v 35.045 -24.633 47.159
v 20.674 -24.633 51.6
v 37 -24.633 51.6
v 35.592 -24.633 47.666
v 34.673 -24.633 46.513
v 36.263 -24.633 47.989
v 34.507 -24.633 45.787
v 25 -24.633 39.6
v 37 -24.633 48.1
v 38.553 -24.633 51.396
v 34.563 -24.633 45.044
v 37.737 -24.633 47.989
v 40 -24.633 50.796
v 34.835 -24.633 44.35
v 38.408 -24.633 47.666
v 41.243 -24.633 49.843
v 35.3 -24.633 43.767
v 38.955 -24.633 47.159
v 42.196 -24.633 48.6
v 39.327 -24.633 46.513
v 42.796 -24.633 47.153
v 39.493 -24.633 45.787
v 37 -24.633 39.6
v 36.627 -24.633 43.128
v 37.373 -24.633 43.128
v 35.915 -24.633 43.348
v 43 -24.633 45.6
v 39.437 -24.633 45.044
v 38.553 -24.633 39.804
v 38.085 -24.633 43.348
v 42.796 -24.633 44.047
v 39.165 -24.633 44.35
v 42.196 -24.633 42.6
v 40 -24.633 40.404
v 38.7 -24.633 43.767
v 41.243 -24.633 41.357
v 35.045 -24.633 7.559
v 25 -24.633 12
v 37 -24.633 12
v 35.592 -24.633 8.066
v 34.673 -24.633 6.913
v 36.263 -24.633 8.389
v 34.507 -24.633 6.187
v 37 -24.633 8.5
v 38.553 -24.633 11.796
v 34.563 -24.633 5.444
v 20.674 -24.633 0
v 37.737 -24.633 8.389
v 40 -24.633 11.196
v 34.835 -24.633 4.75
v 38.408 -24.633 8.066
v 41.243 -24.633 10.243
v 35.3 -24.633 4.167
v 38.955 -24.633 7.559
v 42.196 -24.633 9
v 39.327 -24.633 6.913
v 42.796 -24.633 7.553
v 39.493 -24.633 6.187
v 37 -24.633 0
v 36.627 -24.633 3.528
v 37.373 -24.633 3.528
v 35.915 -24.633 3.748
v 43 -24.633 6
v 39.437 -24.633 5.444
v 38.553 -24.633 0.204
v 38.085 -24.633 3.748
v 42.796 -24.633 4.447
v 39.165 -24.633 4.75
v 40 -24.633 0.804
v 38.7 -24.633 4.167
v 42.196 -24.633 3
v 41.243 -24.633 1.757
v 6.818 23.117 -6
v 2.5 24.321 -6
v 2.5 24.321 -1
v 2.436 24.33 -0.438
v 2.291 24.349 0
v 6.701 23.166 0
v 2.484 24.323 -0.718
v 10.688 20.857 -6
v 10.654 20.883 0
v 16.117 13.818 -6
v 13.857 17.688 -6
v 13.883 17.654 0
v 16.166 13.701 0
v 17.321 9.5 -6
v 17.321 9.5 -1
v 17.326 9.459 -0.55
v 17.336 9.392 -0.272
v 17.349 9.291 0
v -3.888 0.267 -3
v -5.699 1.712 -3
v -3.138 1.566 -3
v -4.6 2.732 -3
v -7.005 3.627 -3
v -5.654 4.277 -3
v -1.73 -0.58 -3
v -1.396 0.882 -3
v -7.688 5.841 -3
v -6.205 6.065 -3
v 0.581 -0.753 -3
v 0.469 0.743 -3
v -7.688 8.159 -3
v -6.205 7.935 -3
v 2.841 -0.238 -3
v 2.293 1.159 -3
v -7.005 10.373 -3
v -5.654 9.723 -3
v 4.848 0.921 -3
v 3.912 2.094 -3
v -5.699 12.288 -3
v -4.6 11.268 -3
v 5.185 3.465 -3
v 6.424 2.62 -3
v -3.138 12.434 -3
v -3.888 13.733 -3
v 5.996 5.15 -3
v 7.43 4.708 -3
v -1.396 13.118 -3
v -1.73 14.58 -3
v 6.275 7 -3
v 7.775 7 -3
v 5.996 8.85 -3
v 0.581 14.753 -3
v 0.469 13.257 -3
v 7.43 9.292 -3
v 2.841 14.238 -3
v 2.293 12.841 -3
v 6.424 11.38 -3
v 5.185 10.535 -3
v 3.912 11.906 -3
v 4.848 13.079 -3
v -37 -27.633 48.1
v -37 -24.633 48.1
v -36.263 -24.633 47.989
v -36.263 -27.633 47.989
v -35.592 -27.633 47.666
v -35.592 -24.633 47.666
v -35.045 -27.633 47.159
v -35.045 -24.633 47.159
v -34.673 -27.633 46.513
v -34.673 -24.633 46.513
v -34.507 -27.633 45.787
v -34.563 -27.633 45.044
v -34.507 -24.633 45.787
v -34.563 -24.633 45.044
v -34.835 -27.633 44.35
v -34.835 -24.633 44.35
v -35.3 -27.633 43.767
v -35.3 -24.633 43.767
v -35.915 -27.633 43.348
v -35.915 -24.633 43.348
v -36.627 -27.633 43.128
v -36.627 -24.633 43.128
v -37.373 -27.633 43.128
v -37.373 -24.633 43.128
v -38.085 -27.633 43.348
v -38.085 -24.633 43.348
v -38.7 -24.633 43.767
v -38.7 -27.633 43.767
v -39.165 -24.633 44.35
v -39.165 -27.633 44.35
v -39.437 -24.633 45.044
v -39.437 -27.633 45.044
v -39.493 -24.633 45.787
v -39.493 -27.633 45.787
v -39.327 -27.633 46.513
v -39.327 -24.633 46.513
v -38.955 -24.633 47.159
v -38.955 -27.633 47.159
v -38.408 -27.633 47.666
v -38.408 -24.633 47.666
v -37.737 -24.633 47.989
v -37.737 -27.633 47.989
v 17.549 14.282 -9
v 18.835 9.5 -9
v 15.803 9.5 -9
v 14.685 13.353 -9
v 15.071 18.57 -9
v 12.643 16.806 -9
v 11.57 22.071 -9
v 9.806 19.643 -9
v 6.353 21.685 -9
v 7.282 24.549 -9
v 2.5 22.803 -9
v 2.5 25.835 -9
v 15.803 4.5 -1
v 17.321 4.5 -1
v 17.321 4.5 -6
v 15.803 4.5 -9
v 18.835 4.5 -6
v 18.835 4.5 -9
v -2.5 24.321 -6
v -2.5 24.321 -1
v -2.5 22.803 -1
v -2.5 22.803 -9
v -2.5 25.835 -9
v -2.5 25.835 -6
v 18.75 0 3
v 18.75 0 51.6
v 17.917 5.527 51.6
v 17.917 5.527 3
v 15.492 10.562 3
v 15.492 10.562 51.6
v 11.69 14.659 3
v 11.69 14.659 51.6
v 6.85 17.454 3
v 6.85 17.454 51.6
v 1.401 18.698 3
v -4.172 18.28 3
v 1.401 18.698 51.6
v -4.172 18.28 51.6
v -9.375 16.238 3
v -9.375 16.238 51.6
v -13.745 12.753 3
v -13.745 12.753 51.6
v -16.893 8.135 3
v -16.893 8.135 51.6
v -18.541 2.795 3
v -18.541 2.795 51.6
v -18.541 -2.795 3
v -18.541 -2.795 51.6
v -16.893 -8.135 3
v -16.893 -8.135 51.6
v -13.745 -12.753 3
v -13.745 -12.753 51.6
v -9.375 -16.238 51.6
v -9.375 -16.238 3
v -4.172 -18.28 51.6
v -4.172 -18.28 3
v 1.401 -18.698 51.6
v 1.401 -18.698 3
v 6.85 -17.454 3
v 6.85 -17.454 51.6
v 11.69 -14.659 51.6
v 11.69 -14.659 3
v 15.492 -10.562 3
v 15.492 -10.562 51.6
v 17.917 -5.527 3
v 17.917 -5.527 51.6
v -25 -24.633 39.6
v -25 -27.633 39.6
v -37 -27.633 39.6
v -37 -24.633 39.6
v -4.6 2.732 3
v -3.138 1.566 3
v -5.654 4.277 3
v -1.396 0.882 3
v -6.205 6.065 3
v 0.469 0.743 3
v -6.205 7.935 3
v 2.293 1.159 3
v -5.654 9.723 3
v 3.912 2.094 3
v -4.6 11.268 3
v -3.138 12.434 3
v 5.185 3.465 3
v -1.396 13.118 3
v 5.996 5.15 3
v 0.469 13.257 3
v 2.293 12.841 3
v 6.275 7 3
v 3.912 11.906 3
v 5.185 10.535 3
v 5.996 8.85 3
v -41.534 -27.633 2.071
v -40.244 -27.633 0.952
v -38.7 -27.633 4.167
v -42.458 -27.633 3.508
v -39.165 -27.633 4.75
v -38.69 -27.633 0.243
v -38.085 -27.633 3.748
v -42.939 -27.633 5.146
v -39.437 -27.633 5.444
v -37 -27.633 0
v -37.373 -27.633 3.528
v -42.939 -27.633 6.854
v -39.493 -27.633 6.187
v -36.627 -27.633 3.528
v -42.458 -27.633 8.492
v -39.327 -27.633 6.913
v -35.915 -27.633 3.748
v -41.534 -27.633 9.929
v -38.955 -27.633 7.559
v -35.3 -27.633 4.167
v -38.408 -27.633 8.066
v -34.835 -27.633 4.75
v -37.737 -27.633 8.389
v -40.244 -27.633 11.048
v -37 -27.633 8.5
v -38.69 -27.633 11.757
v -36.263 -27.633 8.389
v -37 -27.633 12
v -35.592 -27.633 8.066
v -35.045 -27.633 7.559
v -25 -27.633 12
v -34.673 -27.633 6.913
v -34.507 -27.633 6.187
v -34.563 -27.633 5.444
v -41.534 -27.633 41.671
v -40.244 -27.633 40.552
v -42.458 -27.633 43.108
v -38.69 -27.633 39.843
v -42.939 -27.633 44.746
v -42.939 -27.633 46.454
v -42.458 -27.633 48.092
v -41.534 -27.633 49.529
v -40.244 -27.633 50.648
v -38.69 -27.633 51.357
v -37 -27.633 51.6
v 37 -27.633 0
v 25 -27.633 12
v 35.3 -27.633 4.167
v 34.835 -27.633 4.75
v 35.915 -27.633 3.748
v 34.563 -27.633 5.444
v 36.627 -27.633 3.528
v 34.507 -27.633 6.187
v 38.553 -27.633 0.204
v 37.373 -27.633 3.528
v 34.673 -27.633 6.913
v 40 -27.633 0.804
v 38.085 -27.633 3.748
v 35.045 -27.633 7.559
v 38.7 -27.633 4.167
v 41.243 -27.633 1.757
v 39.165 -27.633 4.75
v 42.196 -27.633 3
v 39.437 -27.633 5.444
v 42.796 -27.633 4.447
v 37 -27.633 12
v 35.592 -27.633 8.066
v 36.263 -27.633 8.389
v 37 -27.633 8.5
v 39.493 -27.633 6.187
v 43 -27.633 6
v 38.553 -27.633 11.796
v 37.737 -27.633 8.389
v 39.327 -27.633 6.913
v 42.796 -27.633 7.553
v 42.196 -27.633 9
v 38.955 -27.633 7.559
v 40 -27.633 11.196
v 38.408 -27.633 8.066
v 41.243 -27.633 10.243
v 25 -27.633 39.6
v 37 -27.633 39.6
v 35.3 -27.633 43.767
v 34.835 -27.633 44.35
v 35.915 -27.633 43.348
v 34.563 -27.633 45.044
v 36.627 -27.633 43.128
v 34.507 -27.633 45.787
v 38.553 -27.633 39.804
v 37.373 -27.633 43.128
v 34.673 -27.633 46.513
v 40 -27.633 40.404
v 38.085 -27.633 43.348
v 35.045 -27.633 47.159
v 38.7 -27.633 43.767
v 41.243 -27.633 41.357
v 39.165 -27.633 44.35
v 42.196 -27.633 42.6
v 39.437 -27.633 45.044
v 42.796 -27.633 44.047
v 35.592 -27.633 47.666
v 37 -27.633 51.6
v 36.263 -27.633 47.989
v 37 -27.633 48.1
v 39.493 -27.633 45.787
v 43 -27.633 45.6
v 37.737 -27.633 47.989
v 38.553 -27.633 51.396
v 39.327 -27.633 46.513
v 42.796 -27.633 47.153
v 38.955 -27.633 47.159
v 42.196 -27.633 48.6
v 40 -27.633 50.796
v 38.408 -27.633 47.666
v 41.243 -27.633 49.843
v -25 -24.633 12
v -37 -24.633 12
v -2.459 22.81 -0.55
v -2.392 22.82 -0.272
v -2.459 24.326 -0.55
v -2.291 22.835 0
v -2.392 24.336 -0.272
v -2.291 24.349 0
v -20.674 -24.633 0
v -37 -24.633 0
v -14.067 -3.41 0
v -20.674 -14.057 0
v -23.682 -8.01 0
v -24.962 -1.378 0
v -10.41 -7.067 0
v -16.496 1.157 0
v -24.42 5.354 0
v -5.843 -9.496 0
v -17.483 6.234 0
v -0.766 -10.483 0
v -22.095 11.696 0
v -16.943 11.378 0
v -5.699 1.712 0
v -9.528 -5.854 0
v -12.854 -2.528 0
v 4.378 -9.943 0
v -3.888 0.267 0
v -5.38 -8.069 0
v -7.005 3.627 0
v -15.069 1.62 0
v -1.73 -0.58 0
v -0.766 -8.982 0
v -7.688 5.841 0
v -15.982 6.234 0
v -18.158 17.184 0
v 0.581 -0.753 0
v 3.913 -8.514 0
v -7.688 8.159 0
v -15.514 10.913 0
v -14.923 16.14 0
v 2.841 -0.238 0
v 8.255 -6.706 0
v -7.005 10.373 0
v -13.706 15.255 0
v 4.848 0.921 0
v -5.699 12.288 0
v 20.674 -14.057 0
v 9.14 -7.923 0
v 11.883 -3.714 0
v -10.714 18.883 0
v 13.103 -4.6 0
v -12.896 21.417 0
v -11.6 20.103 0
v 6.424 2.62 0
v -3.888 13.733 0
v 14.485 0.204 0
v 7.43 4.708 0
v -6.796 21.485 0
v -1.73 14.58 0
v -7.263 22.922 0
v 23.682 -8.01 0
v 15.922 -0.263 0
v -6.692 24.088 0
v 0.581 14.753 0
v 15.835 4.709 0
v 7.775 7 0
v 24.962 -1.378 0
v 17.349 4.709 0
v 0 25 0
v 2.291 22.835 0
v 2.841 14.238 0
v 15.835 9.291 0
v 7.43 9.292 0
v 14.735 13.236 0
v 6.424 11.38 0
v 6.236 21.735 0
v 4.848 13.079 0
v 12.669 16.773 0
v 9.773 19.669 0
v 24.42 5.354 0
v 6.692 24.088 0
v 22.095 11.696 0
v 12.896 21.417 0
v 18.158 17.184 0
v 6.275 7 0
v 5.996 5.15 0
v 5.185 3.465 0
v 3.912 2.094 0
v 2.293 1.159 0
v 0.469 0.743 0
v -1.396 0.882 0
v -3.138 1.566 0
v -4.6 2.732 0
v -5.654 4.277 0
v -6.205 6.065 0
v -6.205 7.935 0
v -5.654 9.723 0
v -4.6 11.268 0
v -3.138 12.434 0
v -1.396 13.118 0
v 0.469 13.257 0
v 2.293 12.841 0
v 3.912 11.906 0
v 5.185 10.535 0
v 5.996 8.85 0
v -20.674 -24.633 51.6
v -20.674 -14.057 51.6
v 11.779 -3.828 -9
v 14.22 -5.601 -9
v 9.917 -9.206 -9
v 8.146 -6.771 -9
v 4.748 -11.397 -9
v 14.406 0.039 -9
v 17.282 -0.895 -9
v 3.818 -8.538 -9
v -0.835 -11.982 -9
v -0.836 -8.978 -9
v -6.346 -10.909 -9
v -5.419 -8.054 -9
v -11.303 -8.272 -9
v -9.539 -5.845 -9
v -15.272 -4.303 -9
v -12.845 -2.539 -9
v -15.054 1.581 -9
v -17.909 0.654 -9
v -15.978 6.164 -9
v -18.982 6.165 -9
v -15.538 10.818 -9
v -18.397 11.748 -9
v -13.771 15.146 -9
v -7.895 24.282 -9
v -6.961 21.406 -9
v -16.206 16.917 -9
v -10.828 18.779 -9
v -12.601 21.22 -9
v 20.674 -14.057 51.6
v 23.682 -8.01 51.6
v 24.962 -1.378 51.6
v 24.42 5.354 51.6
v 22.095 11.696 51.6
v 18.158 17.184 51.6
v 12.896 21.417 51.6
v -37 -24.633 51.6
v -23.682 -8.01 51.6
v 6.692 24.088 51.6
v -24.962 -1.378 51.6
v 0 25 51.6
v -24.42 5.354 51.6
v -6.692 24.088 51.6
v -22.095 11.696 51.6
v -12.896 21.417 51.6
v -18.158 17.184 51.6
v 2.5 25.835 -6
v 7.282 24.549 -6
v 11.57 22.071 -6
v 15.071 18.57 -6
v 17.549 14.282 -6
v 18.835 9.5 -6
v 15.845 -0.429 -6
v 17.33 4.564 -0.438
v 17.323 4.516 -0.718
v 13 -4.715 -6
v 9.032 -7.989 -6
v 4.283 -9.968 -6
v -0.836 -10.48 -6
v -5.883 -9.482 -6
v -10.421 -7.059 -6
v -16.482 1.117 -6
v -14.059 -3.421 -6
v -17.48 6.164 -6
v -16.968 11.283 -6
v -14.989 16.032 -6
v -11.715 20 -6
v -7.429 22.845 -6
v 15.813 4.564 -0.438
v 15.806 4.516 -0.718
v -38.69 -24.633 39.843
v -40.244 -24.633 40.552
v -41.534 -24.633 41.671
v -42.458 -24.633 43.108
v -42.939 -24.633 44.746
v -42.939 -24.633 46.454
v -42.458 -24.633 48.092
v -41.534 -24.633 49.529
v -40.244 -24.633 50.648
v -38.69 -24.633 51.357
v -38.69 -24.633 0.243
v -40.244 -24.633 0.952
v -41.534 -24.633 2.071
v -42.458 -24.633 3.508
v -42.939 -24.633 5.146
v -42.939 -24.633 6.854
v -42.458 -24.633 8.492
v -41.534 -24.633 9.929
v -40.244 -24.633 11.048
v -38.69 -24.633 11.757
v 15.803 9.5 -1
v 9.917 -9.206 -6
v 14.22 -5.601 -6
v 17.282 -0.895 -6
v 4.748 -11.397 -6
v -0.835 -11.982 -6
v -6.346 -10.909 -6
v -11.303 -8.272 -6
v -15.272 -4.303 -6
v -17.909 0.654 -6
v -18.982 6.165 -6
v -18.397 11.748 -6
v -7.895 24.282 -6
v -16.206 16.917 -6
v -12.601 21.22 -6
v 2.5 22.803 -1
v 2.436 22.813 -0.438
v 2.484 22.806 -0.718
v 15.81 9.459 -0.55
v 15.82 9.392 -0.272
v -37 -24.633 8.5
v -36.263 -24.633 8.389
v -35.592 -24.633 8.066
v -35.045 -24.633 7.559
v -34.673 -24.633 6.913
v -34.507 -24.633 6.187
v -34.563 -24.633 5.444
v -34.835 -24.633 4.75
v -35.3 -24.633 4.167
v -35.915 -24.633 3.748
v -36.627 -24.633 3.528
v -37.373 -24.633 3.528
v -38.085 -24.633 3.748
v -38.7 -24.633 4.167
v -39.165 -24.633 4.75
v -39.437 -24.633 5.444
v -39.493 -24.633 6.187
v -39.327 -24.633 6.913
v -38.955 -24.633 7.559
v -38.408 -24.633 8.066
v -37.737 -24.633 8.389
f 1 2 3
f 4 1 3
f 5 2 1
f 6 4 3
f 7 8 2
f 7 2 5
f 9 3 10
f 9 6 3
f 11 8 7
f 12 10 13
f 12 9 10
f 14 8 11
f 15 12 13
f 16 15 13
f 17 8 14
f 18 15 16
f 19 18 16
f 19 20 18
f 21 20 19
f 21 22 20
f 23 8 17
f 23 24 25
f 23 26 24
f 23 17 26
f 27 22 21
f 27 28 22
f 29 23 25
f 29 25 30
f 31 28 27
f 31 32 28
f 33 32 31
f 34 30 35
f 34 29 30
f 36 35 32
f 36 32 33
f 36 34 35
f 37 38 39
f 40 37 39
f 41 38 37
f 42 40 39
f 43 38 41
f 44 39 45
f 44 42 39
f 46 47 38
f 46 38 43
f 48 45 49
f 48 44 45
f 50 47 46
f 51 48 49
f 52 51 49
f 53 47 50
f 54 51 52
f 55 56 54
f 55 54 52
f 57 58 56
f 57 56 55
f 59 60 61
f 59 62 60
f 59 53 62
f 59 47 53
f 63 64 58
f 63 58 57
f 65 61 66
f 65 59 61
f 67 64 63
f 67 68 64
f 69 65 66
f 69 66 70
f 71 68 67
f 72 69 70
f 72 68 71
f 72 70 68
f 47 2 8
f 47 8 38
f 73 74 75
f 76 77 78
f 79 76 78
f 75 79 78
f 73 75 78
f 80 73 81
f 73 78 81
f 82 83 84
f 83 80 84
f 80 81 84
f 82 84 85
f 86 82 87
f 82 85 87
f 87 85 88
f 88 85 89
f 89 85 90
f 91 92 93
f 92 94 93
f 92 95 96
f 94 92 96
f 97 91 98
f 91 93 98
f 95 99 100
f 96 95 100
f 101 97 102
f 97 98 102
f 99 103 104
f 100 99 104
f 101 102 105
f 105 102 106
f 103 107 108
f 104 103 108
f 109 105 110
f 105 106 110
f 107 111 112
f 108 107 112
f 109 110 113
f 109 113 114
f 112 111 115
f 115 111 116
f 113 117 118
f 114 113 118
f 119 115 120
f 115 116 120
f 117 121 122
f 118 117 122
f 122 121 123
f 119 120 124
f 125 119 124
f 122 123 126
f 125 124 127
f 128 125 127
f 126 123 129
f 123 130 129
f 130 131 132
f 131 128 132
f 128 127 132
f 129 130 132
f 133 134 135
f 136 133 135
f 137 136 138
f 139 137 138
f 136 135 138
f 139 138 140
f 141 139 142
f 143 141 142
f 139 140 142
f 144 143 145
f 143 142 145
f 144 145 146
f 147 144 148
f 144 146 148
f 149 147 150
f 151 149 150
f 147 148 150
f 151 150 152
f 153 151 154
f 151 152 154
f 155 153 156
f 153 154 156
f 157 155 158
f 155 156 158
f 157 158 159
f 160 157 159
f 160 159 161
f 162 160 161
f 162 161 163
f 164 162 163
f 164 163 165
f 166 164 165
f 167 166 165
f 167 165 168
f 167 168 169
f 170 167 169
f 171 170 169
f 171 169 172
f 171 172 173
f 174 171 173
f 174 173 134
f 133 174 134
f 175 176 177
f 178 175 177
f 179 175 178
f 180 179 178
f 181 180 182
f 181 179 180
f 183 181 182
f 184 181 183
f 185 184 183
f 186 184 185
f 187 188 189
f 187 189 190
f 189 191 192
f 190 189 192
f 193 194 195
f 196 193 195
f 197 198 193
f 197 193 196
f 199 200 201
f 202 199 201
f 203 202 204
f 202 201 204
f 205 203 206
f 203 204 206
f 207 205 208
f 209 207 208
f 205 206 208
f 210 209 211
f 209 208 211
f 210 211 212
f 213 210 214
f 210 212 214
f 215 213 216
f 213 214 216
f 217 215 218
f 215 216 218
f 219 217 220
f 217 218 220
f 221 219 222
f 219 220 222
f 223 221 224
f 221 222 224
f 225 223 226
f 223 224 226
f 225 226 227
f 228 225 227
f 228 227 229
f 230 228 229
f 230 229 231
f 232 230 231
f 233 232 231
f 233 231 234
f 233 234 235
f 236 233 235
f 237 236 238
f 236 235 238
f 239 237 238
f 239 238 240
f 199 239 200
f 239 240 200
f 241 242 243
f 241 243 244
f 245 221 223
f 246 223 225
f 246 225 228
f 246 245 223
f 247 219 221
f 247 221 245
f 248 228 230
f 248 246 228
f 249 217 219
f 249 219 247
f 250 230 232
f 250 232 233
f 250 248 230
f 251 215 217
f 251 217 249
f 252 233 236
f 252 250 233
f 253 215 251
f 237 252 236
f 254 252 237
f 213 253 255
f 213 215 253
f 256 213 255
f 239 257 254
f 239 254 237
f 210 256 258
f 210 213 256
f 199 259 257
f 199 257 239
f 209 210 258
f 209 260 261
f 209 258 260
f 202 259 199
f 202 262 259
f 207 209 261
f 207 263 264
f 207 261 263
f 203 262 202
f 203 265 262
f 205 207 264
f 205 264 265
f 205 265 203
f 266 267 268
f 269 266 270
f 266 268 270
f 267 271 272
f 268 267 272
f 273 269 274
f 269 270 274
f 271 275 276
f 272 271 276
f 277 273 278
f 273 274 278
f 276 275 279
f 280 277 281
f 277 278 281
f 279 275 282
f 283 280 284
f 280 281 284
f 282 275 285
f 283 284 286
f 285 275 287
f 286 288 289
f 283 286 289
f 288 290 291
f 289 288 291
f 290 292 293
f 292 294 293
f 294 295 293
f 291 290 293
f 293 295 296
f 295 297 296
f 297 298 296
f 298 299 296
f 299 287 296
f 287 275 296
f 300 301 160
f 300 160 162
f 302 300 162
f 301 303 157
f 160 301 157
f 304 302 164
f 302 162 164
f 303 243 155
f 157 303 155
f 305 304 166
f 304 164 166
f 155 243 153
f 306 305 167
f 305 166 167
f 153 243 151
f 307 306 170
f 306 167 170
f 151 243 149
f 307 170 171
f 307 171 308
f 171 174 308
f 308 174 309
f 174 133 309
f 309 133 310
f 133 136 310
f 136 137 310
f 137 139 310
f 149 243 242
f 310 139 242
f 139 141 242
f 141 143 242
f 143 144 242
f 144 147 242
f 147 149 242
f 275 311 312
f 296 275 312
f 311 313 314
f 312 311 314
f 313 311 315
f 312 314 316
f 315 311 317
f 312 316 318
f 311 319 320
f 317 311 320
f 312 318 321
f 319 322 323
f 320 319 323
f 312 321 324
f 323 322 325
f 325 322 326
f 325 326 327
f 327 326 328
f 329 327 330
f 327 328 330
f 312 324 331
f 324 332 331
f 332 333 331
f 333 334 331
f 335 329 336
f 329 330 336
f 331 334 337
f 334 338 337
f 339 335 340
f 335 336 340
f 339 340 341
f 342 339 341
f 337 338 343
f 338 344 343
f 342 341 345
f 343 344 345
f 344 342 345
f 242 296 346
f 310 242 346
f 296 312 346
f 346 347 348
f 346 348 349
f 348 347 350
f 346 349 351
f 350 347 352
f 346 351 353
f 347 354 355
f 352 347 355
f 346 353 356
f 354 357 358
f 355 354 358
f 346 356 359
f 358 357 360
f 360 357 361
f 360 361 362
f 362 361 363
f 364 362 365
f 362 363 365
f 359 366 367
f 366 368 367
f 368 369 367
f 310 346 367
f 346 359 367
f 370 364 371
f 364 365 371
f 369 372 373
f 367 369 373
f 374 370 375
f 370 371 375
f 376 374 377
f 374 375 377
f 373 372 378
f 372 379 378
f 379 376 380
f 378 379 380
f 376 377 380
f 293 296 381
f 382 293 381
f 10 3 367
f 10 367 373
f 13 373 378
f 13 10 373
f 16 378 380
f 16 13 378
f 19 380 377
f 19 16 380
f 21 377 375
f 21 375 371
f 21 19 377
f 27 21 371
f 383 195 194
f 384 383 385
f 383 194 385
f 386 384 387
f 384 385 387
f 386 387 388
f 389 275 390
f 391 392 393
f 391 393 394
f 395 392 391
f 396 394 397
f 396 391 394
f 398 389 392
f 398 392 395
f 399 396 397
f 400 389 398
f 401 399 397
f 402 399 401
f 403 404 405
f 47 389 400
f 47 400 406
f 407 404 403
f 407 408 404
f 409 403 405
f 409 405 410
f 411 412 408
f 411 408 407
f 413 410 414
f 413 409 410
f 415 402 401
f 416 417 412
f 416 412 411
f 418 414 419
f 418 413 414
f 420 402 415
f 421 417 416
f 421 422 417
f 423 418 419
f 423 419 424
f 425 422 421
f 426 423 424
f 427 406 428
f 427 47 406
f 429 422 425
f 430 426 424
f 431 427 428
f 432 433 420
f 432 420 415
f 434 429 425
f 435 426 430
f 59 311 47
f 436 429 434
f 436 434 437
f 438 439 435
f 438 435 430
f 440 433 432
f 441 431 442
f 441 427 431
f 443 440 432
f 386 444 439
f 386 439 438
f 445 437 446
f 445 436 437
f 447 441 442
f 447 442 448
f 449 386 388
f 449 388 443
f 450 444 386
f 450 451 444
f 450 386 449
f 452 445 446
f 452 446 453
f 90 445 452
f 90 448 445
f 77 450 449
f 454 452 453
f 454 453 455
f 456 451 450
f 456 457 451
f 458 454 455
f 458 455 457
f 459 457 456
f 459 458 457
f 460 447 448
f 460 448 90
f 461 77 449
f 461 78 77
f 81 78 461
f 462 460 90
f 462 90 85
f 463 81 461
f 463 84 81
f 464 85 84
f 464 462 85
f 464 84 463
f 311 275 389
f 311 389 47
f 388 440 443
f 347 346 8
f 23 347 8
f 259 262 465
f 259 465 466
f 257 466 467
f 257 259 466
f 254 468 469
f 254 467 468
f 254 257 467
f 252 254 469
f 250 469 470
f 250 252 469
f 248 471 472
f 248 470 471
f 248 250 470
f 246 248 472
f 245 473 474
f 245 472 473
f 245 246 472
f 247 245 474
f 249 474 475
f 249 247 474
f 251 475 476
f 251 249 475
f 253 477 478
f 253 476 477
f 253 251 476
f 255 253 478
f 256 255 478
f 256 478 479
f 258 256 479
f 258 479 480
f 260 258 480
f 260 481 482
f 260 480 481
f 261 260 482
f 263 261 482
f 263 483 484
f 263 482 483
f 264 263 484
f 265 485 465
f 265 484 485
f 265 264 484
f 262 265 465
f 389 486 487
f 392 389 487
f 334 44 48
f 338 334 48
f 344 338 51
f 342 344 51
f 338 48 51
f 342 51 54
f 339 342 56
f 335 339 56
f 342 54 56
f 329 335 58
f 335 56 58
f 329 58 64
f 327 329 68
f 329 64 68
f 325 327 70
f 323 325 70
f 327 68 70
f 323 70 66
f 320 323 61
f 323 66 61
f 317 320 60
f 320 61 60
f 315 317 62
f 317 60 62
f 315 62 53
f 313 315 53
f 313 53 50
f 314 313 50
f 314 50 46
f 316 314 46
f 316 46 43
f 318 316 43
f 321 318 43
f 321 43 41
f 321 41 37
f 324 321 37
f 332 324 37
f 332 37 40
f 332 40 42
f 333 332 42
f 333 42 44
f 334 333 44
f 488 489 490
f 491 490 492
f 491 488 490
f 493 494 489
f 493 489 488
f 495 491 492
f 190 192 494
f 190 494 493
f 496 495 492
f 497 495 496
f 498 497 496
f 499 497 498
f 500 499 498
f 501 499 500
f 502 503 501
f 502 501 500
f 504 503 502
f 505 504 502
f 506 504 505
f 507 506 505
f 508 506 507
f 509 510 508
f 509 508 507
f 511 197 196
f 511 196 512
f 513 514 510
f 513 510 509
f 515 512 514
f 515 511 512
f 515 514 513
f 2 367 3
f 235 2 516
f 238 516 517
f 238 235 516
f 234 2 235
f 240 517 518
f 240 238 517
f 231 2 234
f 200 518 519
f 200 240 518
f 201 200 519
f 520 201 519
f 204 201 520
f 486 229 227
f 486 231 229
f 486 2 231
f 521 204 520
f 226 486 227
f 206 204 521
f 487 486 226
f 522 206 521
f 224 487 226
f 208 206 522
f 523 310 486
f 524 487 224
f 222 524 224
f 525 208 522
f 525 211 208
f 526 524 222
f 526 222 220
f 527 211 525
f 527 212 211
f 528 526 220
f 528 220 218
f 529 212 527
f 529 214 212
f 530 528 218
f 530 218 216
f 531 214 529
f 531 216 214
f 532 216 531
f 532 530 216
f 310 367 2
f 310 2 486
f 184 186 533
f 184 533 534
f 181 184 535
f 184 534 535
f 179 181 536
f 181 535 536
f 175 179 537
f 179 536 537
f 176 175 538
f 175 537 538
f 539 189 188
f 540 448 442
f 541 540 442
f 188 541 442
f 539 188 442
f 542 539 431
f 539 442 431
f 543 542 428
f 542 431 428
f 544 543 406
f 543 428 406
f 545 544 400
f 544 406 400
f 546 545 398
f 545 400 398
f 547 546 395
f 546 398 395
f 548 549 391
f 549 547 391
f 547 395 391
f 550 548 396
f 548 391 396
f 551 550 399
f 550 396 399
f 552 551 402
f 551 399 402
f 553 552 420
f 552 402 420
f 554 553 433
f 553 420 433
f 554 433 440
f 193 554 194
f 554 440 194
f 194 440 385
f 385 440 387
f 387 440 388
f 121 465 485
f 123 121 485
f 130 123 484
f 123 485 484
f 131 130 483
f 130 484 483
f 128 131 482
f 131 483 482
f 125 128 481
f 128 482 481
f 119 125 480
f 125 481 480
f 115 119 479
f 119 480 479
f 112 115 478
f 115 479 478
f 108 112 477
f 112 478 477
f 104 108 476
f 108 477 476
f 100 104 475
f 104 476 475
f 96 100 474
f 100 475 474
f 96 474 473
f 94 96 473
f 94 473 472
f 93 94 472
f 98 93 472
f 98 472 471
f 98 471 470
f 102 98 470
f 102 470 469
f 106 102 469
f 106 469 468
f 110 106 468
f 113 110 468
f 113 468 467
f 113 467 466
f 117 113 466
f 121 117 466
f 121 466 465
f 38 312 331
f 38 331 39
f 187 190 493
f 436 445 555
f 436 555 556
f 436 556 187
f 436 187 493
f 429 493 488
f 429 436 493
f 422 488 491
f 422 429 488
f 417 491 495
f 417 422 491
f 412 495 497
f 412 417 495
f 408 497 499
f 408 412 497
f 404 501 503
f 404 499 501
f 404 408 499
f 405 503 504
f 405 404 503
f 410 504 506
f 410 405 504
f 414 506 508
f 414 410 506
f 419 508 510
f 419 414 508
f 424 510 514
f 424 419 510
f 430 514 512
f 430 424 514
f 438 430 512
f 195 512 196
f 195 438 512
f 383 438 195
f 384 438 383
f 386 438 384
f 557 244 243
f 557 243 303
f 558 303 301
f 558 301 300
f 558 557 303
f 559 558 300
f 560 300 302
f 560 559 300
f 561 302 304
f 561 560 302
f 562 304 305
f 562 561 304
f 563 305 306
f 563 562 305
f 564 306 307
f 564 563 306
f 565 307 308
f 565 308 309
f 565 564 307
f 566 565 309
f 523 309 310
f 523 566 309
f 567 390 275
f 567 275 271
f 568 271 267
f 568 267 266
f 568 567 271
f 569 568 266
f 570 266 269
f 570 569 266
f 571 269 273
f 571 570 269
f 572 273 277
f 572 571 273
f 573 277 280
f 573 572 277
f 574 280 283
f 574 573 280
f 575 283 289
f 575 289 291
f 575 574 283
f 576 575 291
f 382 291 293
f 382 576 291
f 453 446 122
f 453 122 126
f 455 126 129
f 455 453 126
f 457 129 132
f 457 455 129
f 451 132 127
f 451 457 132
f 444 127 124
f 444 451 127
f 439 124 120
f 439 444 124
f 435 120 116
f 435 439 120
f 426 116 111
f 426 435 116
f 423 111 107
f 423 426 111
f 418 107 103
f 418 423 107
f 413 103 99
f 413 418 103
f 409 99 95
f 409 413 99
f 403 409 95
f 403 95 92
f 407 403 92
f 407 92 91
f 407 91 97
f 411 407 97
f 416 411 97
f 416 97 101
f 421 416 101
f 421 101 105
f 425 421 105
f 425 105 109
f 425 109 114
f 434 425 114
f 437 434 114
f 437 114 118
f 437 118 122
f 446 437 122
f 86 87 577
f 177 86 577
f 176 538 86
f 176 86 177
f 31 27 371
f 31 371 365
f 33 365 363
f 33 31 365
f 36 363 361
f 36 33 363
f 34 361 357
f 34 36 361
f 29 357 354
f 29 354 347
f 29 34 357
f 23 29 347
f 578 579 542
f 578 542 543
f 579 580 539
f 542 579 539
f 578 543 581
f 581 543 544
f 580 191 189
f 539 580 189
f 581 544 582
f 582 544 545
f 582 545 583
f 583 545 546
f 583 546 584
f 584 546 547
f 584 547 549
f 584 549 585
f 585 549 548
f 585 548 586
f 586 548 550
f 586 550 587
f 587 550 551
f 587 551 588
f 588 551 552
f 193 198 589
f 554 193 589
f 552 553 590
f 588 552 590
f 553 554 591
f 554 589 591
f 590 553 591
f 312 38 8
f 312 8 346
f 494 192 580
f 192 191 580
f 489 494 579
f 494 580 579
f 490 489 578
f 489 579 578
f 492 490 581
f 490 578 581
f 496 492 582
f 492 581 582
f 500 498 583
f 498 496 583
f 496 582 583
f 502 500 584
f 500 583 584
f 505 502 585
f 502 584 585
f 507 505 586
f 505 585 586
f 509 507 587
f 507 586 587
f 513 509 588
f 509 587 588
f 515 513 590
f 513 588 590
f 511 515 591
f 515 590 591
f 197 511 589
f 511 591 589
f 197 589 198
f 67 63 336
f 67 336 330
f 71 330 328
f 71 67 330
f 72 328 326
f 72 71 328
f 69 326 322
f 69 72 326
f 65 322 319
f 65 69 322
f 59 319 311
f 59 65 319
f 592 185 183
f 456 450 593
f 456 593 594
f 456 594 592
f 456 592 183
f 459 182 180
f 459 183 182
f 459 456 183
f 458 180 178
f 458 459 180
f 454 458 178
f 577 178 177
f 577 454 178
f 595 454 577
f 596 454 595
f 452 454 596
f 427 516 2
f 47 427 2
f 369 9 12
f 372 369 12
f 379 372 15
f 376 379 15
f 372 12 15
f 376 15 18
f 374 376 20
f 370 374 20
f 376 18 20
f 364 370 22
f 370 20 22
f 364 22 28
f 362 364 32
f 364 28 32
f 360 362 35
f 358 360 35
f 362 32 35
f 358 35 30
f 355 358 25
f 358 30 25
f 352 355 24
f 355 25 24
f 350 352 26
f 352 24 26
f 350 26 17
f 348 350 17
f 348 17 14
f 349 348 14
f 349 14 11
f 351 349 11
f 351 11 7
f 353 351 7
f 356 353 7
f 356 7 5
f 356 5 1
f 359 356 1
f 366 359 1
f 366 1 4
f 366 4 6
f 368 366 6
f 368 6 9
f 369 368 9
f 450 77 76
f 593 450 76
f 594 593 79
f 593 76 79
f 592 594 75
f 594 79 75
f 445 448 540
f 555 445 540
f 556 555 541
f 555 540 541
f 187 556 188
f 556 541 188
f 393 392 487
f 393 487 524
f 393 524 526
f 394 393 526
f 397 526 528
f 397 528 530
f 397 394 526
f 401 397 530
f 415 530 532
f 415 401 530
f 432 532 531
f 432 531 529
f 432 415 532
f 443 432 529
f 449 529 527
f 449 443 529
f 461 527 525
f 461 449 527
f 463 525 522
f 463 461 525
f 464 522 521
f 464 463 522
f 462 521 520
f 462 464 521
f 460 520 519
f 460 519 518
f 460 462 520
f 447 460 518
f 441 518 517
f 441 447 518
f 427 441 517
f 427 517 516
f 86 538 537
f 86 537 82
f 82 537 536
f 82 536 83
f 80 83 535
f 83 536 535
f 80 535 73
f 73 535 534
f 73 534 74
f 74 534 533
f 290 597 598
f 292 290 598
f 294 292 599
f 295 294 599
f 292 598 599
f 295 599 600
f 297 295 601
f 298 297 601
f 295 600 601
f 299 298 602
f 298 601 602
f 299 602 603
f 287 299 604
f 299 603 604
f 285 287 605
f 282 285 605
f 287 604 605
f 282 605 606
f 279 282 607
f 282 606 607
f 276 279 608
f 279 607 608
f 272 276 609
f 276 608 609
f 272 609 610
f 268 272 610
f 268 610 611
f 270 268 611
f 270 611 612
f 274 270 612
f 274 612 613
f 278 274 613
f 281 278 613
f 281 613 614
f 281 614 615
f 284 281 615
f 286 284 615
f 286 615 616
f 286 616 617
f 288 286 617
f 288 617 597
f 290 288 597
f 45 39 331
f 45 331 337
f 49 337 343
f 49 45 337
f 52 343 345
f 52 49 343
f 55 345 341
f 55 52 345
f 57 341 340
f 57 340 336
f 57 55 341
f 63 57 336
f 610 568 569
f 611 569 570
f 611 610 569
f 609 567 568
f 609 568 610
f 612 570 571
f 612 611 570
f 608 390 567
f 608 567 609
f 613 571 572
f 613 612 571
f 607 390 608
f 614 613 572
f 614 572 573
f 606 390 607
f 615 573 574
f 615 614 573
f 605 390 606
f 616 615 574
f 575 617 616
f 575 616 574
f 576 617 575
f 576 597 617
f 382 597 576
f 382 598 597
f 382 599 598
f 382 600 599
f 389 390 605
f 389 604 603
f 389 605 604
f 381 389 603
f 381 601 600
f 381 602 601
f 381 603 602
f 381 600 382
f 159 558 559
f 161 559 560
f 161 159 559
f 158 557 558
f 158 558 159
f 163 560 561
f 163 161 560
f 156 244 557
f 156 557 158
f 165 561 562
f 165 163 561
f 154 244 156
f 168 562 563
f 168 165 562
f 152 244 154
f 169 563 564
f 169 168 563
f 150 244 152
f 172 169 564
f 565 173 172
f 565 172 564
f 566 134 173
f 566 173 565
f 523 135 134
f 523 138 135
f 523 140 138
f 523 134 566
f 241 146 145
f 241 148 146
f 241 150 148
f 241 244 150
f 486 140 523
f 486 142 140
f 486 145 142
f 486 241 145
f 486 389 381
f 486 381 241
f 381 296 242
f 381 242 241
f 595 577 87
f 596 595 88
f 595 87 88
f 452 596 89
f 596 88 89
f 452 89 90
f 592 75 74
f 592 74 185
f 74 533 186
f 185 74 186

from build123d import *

# Parameters (mm, degrees)
CROQUIS1_R                 = 21.1
SALIENTE_EXTRUIR1_DEPTH    = 51.6
CROQUIS2_R                 = 18.75
CORTAR_EXTRUIR1_DEPTH      = 48.6
CROQUIS5_R                 = 7.775
CROQUIS5_R_2               = 6.275
SALIENTE_EXTRUIR3_DEPTH    = 6
CORTAR_EXTRUIR2_START      = -66
CROQUIS6_R                 = 6.275
CORTAR_EXTRUIR2_DEPTH      = 66
CROQUIS10_R                = 25
CROQUIS10_R_2              = 21.1
SALIENTE_EXTRUIR4_DEPTH    = 51.6
CROQUIS11_R                = 17.5
CROQUIS11_R_2              = 16
SALIENTE_EXTRUIR5_DEPTH    = 9
SALIENTE_EXTRUIR6_START    = -3
CROQUIS12_R                = 19
CROQUIS12_R_2              = 17.5
SALIENTE_EXTRUIR6_DEPTH    = 3
SALIENTE_EXTRUIR7_DEPTH    = 51.6
SALIENTE_EXTRUIR8_REACH    = 78.981
CROQUIS14_W                = 51.6
CROQUIS14_H                = 3
CROQUIS16_W                = 12
CROQUIS16_H                = 3
SALIENTE_EXTRUIR9_DEPTH    = 12
SALIENTE_EXTRUIR11_DEPTH   = 3
CROQUIS19_R                = 2.5
CORTAR_EXTRUIR5_DEPTH      = 15
CROQUIS20_W                = 12
CROQUIS20_H                = 3
SALIENTE_EXTRUIR12_DEPTH   = 12
SALIENTE_EXTRUIR13_DEPTH   = 3
CROQUIS22_R                = 2.5
CORTAR_EXTRUIR6_DEPTH      = 12
SALIENTE_EXTRUIR14_DEPTH   = 8
SALIENTE_EXTRUIR14_2_DEPTH = 8
CROQUIS26_W                = 2.5
CROQUIS26_H                = 8
CORTAR_EXTRUIR11_DEPTH     = 10
CROQUIS27_W                = 8
CROQUIS27_H                = 2.5
CORTAR_EXTRUIR12_DEPTH     = 13


with BuildPart() as part:
    # Croquis1 → Saliente-Extruir1 (new body)
    with BuildSketch(Plane.XY):
        with Locations(Location((0, 0, 0), (0, 0, 180))):
            Circle(CROQUIS1_R)
    extrude(amount=SALIENTE_EXTRUIR1_DEPTH)

    # Croquis2 → Cortar-Extruir1 (cut)
    with BuildSketch(Plane.XY.offset(51.6)):
        Circle(CROQUIS2_R)
    extrude(amount=-CORTAR_EXTRUIR1_DEPTH, mode=Mode.SUBTRACT)

    # Croquis5 → Saliente-Extruir3 (add)
    with BuildSketch(Plane.XY.offset(3)):
        with Locations((0, 7)):
            Circle(CROQUIS5_R)
        with Locations((0, 7)):
            Circle(CROQUIS5_R_2, mode=Mode.SUBTRACT)
    extrude(amount=-SALIENTE_EXTRUIR3_DEPTH)

    # Croquis6 → Cortar-Extruir2 (cut)
    with BuildSketch(Plane(origin=(0, 0, 0), x_dir=(-1, 0, 0), z_dir=(0, 0, -1)).offset(CORTAR_EXTRUIR2_START)):
        with Locations(Location((0, 7, 0), (0, 0, 180))):
            Circle(CROQUIS6_R)
    extrude(amount=CORTAR_EXTRUIR2_DEPTH, mode=Mode.SUBTRACT)

    # Croquis10 → Saliente-Extruir4 (add)
    with BuildSketch(Plane(origin=(0, 0, 0), x_dir=(-1, 0, 0), z_dir=(0, 0, -1))):
        Circle(CROQUIS10_R)
        Circle(CROQUIS10_R_2, mode=Mode.SUBTRACT)
    extrude(amount=-SALIENTE_EXTRUIR4_DEPTH)

    # Croquis11 → Saliente-Extruir5 (add)
    with BuildSketch(Plane(origin=(0, 0, 0), x_dir=(-1, 0, 0), z_dir=(0, 0, -1))):
        with Locations(Location((0, 7, 0), (0, 0, 180))):
            Circle(CROQUIS11_R)
        with Locations((0, 7)):
            Circle(CROQUIS11_R_2, mode=Mode.SUBTRACT)
    extrude(amount=SALIENTE_EXTRUIR5_DEPTH)

    # Croquis12 → Saliente-Extruir6 (add)
    with BuildSketch(Plane(origin=(0, 0, -9), x_dir=(-1, 0, 0), z_dir=(0, 0, -1)).offset(SALIENTE_EXTRUIR6_START)):
        with Locations((0, 7)):
            Circle(CROQUIS12_R)
        with Locations(Location((0, 7, 0), (0, 0, 180))):
            Circle(CROQUIS12_R_2, mode=Mode.SUBTRACT)
    extrude(amount=SALIENTE_EXTRUIR6_DEPTH)

    # Croquis13 → Saliente-Extruir7 (add)
    with BuildSketch(Plane(origin=(0, 0, 0), x_dir=(-1, 0, 0), z_dir=(0, 0, -1))):
        with BuildLine():
            Line((-20.673776338, -25), (0, -25))
            ThreePointArc((0, -25), (-11.695700136, -22.095488189), (-20.673776338, -14.056847866))
            Line((-20.673776338, -14.056847866), (-20.673776338, -25))
        make_face()
        with BuildLine():
            ThreePointArc((20.673776338, -14.056847866), (11.695700136, -22.095488189), (0, -25))
            Line((0, -25), (20.673776338, -25))
            Line((20.673776338, -25), (20.673776338, -14.056847866))
        make_face()
        Polygon((25, -27.632757418), (25, -25), (0, -25), (-25, -25), (-25, -27.632757418), align=None)
    extrude(amount=-SALIENTE_EXTRUIR7_DEPTH)

    # Saliente-Extruir8: up to this face of the body (flat: up to its plane)
    saliente_extruir8_end = Plane(part.part.faces().sort_by_distance((-25, -26.316378709, 25.8))[0])
    # Croquis14 → Saliente-Extruir8 (add, up to the picked face)
    with BuildSketch(Plane(origin=(25, 0, 0), x_dir=(0, 0, -1), z_dir=(1, 0, 0)), mode=Mode.PRIVATE) as saliente_extruir8_sk1:
        with Locations((-25.8, -26.132757418)):
            Rectangle(CROQUIS14_W, CROQUIS14_H)
    saliente_extruir8_tool1 = split(extrude(saliente_extruir8_sk1.sketch, amount=-SALIENTE_EXTRUIR8_REACH, mode=Mode.PRIVATE), bisect_by=saliente_extruir8_end, keep=Keep.BOTH, mode=Mode.PRIVATE)
    add(saliente_extruir8_tool1.solids().sort_by(Axis((25, -26.132757, 25.8), (-1, 0, 0)))[0])

    # Croquis16 → Saliente-Extruir9 (add)
    with BuildSketch(Plane(origin=(25, 0, 0), x_dir=(0, 0, -1), z_dir=(1, 0, 0))):
        with Locations((-45.6, -26.132757418)):
            Rectangle(CROQUIS16_W, CROQUIS16_H)
        with Locations((-6, -26.132757418)):
            Rectangle(CROQUIS16_W, CROQUIS16_H)
    extrude(amount=SALIENTE_EXTRUIR9_DEPTH)

    # Croquis18 → Saliente-Extruir11 (add)
    with BuildSketch(Plane(origin=(0, -24.632757418, 0), x_dir=(1, 0, 0), z_dir=(0, 1, 0))):
        with BuildLine():
            ThreePointArc((37, -12), (41.242640687, -10.242640687), (43, -6))
            ThreePointArc((43, -6), (41.242640687, -1.757359313), (37, 0))
            Line((37, 0), (37, -12))
        make_face()
        with BuildLine():
            Line((37, -12), (37, 0))
            ThreePointArc((37, 0), (31, -6), (37, -12))
        make_face()
        with BuildLine():
            ThreePointArc((43, -45.6), (41.242640687, -41.357359313), (37, -39.6))
            Line((37, -39.6), (37, -51.6))
            ThreePointArc((37, -51.6), (41.242640687, -49.842640687), (43, -45.6))
        make_face()
        with BuildLine():
            Line((37, -51.6), (37, -39.6))
            ThreePointArc((37, -39.6), (31, -45.6), (37, -51.6))
        make_face()
    extrude(amount=-SALIENTE_EXTRUIR11_DEPTH)

    # Croquis19 → Cortar-Extruir5 (cut)
    with BuildSketch(Plane(origin=(0, -24.632757418, 0), x_dir=(1, 0, 0), z_dir=(0, 1, 0))):
        with Locations(Location((37, -6, 0), (0, 0, 270))):
            Circle(CROQUIS19_R)
        with Locations(Location((37, -45.6, 0), (0, 0, 270))):
            Circle(CROQUIS19_R)
    extrude(amount=-CORTAR_EXTRUIR5_DEPTH, mode=Mode.SUBTRACT)

    # Croquis20 → Saliente-Extruir12 (add)
    with BuildSketch(Plane.ZY.offset(25)):
        with Locations((6, -26.132757418)):
            Rectangle(CROQUIS20_W, CROQUIS20_H)
        with Locations((45.6, -26.132757418)):
            Rectangle(CROQUIS20_W, CROQUIS20_H)
    extrude(amount=SALIENTE_EXTRUIR12_DEPTH)

    # Croquis21 → Saliente-Extruir13 (add)
    with BuildSketch(Plane(origin=(0, -24.632757418, 0), x_dir=(1, 0, 0), z_dir=(0, 1, 0))):
        with BuildLine():
            ThreePointArc((-31, -6), (-32.757359313, -1.757359313), (-37, 0))
            Line((-37, 0), (-37, -12))
            ThreePointArc((-37, -12), (-32.757359313, -10.242640687), (-31, -6))
        make_face()
        with BuildLine():
            Line((-37, -12), (-37, 0))
            ThreePointArc((-37, 0), (-43, -6), (-37, -12))
        make_face()
        with BuildLine():
            ThreePointArc((-31, -45.6), (-32.757359313, -41.357359313), (-37, -39.6))
            Line((-37, -39.6), (-37, -51.6))
            ThreePointArc((-37, -51.6), (-32.757359313, -49.842640687), (-31, -45.6))
        make_face()
        with BuildLine():
            Line((-37, -51.6), (-37, -39.6))
            ThreePointArc((-37, -39.6), (-43, -45.6), (-37, -51.6))
        make_face()
    extrude(amount=-SALIENTE_EXTRUIR13_DEPTH)

    # Croquis22 → Cortar-Extruir6 (cut)
    with BuildSketch(Plane(origin=(0, -24.632757418, 0), x_dir=(1, 0, 0), z_dir=(0, 1, 0))):
        with Locations(Location((-37, -6, 0), (0, 0, 270))):
            Circle(CROQUIS22_R)
        with Locations(Location((-37, -45.6, 0), (0, 0, 270))):
            Circle(CROQUIS22_R)
    extrude(amount=-CORTAR_EXTRUIR6_DEPTH, mode=Mode.SUBTRACT)


with BuildPart() as body_2:
    # Croquis23 → Saliente-Extruir14 (new body)
    with BuildSketch(Plane(origin=(0, 0, -9), x_dir=(-1, 0, 0), z_dir=(0, 0, -1))):
        Polygon((2.5, 29.282754404), (2.5, 26), (0, 26), (-2.5, 26), (-2.5, 29.282754404), align=None)
    extrude(amount=-SALIENTE_EXTRUIR14_DEPTH)


with BuildPart() as body_3:
    # Croquis23 → Saliente-Extruir14 2 (new body)
    with BuildSketch(Plane(origin=(0, 0, -9), x_dir=(-1, 0, 0), z_dir=(0, 0, -1))):
        Polygon((-23.376501852, 9.5), (-23.376501852, 4.5), (-19, 4.5), (-19, 7), (-19, 9.5), align=None)
    extrude(amount=-SALIENTE_EXTRUIR14_2_DEPTH)


with BuildPart() as cortar_extruir11_tool:
    # Croquis26 → Cortar-Extruir11 (new body)
    with BuildSketch(Plane(origin=(0, 29.282754404, 0), x_dir=(1, 0, 0), z_dir=(0, 1, 0))):
        with BuildLine():
            ThreePointArc((2.5, 9), (0, 11.5), (-2.5, 9))
            Line((-2.5, 9), (2.5, 9))
        make_face()
        with Locations((-1.25, 5)):
            Rectangle(CROQUIS26_W, CROQUIS26_H)
        with Locations((1.25, 5)):
            Rectangle(CROQUIS26_W, CROQUIS26_H)
        with BuildLine():
            Line((2.5, 1), (0, 1))
            Line((0, 1), (-2.5, 1))
            ThreePointArc((-2.5, 1), (-2.447265782, 0.489225891), (-2.291287847, 0))
            Line((-2.291287847, 0), (2.291287847, 0))
            ThreePointArc((2.291287847, 0), (2.447265782, 0.489225891), (2.5, 1))
        make_face()
    extrude(amount=-CORTAR_EXTRUIR11_DEPTH)


with BuildPart() as part_1:
    add(part.part)

    # Cortar-Extruir11: cut by cortar_extruir11_tool
    add(cortar_extruir11_tool.part, mode=Mode.SUBTRACT)


with BuildPart() as body_2_1:
    add(body_2.part)

    # Cortar-Extruir11: cut by cortar_extruir11_tool
    add(cortar_extruir11_tool.part, mode=Mode.SUBTRACT)


with BuildPart() as cortar_extruir12_tool:
    # Croquis27 → Cortar-Extruir12 (new body)
    with BuildSketch(Plane(origin=(23.376501852, 0, 0), x_dir=(0, 0, -1), z_dir=(1, 0, 0))):
        with BuildLine():
            Line((1, 4.5), (1, 7))
            Line((1, 7), (1, 9.5))
            ThreePointArc((1, 9.5), (0.489225891, 9.447265782), (0, 9.291287847))
            Line((0, 9.291287847), (0, 4.708712153))
            ThreePointArc((0, 4.708712153), (0.489225891, 4.552734218), (1, 4.5))
        make_face()
        with Locations((5, 8.25)):
            Rectangle(CROQUIS27_W, CROQUIS27_H)
        with Locations((5, 5.75)):
            Rectangle(CROQUIS27_W, CROQUIS27_H)
        with BuildLine():
            ThreePointArc((9, 4.5), (11.5, 7), (9, 9.5))
            Line((9, 9.5), (9, 4.5))
        make_face()
    extrude(amount=-CORTAR_EXTRUIR12_DEPTH)


with BuildPart() as part_2:
    add(part_1.part)

    # Cortar-Extruir12: cut by cortar_extruir12_tool
    add(cortar_extruir12_tool.part, mode=Mode.SUBTRACT)


with BuildPart() as body_3_1:
    add(body_3.part)

    # Cortar-Extruir12: cut by cortar_extruir12_tool
    add(cortar_extruir12_tool.part, mode=Mode.SUBTRACT)


solid = part_2.part
